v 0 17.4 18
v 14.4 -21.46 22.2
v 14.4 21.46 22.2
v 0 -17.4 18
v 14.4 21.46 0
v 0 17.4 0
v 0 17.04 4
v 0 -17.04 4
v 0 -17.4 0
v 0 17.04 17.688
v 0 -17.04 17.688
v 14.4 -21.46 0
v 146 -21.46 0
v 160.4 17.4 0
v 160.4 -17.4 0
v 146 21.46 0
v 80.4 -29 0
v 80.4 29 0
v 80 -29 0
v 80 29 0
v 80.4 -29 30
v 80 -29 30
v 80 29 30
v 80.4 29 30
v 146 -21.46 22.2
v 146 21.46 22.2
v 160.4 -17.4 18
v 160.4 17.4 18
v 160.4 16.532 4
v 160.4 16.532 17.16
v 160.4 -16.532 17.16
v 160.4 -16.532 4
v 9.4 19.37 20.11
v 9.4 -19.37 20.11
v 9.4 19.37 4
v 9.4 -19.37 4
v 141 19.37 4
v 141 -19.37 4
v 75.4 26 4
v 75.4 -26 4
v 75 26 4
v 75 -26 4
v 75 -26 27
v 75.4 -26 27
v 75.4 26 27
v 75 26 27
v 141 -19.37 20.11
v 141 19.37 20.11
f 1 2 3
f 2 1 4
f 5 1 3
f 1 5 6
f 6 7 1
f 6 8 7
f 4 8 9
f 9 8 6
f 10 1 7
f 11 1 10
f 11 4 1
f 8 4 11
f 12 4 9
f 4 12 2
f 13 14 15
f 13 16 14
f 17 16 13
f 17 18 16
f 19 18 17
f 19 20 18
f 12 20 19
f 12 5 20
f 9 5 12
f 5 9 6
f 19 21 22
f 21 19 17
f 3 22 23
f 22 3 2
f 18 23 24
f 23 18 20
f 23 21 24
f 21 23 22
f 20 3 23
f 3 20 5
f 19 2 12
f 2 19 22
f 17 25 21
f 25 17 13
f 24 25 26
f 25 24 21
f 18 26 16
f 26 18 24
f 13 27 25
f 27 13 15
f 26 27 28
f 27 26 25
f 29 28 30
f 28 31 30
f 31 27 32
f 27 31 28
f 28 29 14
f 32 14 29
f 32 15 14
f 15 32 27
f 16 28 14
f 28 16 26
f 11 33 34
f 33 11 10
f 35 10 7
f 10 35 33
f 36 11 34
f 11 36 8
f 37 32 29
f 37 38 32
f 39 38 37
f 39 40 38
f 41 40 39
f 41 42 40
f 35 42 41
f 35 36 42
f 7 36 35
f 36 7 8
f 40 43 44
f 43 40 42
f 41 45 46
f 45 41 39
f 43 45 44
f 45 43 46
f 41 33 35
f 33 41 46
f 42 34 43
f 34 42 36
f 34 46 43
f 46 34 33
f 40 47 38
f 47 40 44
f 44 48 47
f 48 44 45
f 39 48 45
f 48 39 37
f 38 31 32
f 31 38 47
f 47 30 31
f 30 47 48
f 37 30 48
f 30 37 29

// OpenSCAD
$fn = 32;

// ----------------------------------------------------------------------
// Faired channel: 160 x 58 x 30 mm, 3 mm walls, faired ends
// ----------------------------------------------------------------------

// --- parameters (mm) ---
length = 160;             // channel length
width = 58;               // channel width at mid length
height = 30;              // channel height at mid length
wall = 3;                 // side wall thickness
floor_t = 4;              // floor thickness
end_w = 34.8;             // faired end width
end_h = 18;               // faired end height

difference() {
  union() {
    hull() {
      translate([0, -17.4, 0]) cube([0.4, 34.8, 18]);
      translate([14.4, -21.46, 0]) cube([0.4, 42.92, 22.2]);
    }
    hull() {
      translate([14.4, -21.46, 0]) cube([0.4, 42.92, 22.2]);
      translate([80, -29, 0]) cube([0.4, 58, 30]);
    }
    hull() {
      translate([80, -29, 0]) cube([0.4, 58, 30]);
      translate([145.6, -21.46, 0]) cube([0.4, 42.92, 22.2]);
    }
    hull() {
      translate([145.6, -21.46, 0]) cube([0.4, 42.92, 22.2]);
      translate([160, -17.4, 0]) cube([0.4, 34.8, 18]);
    }
  }
  /* cavity, 5 mm proud of both ends so the ports are cut clean */
  hull() {
    translate([-5, -15.8, 4]) cube([0.4, 31.6, 12.4]);
    translate([9.4, -19.37, 4]) cube([0.4, 38.74, 16.11]);
  }
  hull() {
    translate([9.4, -19.37, 4]) cube([0.4, 38.74, 16.11]);
    translate([75, -26, 4]) cube([0.4, 52, 23]);
  }
  hull() {
    translate([75, -26, 4]) cube([0.4, 52, 23]);
    translate([140.6, -19.37, 4]) cube([0.4, 38.74, 16.11]);
  }
  hull() {
    translate([140.6, -19.37, 4]) cube([0.4, 38.74, 16.11]);
    translate([165, -15.8, 4]) cube([0.4, 31.6, 12.4]);
  }
}
